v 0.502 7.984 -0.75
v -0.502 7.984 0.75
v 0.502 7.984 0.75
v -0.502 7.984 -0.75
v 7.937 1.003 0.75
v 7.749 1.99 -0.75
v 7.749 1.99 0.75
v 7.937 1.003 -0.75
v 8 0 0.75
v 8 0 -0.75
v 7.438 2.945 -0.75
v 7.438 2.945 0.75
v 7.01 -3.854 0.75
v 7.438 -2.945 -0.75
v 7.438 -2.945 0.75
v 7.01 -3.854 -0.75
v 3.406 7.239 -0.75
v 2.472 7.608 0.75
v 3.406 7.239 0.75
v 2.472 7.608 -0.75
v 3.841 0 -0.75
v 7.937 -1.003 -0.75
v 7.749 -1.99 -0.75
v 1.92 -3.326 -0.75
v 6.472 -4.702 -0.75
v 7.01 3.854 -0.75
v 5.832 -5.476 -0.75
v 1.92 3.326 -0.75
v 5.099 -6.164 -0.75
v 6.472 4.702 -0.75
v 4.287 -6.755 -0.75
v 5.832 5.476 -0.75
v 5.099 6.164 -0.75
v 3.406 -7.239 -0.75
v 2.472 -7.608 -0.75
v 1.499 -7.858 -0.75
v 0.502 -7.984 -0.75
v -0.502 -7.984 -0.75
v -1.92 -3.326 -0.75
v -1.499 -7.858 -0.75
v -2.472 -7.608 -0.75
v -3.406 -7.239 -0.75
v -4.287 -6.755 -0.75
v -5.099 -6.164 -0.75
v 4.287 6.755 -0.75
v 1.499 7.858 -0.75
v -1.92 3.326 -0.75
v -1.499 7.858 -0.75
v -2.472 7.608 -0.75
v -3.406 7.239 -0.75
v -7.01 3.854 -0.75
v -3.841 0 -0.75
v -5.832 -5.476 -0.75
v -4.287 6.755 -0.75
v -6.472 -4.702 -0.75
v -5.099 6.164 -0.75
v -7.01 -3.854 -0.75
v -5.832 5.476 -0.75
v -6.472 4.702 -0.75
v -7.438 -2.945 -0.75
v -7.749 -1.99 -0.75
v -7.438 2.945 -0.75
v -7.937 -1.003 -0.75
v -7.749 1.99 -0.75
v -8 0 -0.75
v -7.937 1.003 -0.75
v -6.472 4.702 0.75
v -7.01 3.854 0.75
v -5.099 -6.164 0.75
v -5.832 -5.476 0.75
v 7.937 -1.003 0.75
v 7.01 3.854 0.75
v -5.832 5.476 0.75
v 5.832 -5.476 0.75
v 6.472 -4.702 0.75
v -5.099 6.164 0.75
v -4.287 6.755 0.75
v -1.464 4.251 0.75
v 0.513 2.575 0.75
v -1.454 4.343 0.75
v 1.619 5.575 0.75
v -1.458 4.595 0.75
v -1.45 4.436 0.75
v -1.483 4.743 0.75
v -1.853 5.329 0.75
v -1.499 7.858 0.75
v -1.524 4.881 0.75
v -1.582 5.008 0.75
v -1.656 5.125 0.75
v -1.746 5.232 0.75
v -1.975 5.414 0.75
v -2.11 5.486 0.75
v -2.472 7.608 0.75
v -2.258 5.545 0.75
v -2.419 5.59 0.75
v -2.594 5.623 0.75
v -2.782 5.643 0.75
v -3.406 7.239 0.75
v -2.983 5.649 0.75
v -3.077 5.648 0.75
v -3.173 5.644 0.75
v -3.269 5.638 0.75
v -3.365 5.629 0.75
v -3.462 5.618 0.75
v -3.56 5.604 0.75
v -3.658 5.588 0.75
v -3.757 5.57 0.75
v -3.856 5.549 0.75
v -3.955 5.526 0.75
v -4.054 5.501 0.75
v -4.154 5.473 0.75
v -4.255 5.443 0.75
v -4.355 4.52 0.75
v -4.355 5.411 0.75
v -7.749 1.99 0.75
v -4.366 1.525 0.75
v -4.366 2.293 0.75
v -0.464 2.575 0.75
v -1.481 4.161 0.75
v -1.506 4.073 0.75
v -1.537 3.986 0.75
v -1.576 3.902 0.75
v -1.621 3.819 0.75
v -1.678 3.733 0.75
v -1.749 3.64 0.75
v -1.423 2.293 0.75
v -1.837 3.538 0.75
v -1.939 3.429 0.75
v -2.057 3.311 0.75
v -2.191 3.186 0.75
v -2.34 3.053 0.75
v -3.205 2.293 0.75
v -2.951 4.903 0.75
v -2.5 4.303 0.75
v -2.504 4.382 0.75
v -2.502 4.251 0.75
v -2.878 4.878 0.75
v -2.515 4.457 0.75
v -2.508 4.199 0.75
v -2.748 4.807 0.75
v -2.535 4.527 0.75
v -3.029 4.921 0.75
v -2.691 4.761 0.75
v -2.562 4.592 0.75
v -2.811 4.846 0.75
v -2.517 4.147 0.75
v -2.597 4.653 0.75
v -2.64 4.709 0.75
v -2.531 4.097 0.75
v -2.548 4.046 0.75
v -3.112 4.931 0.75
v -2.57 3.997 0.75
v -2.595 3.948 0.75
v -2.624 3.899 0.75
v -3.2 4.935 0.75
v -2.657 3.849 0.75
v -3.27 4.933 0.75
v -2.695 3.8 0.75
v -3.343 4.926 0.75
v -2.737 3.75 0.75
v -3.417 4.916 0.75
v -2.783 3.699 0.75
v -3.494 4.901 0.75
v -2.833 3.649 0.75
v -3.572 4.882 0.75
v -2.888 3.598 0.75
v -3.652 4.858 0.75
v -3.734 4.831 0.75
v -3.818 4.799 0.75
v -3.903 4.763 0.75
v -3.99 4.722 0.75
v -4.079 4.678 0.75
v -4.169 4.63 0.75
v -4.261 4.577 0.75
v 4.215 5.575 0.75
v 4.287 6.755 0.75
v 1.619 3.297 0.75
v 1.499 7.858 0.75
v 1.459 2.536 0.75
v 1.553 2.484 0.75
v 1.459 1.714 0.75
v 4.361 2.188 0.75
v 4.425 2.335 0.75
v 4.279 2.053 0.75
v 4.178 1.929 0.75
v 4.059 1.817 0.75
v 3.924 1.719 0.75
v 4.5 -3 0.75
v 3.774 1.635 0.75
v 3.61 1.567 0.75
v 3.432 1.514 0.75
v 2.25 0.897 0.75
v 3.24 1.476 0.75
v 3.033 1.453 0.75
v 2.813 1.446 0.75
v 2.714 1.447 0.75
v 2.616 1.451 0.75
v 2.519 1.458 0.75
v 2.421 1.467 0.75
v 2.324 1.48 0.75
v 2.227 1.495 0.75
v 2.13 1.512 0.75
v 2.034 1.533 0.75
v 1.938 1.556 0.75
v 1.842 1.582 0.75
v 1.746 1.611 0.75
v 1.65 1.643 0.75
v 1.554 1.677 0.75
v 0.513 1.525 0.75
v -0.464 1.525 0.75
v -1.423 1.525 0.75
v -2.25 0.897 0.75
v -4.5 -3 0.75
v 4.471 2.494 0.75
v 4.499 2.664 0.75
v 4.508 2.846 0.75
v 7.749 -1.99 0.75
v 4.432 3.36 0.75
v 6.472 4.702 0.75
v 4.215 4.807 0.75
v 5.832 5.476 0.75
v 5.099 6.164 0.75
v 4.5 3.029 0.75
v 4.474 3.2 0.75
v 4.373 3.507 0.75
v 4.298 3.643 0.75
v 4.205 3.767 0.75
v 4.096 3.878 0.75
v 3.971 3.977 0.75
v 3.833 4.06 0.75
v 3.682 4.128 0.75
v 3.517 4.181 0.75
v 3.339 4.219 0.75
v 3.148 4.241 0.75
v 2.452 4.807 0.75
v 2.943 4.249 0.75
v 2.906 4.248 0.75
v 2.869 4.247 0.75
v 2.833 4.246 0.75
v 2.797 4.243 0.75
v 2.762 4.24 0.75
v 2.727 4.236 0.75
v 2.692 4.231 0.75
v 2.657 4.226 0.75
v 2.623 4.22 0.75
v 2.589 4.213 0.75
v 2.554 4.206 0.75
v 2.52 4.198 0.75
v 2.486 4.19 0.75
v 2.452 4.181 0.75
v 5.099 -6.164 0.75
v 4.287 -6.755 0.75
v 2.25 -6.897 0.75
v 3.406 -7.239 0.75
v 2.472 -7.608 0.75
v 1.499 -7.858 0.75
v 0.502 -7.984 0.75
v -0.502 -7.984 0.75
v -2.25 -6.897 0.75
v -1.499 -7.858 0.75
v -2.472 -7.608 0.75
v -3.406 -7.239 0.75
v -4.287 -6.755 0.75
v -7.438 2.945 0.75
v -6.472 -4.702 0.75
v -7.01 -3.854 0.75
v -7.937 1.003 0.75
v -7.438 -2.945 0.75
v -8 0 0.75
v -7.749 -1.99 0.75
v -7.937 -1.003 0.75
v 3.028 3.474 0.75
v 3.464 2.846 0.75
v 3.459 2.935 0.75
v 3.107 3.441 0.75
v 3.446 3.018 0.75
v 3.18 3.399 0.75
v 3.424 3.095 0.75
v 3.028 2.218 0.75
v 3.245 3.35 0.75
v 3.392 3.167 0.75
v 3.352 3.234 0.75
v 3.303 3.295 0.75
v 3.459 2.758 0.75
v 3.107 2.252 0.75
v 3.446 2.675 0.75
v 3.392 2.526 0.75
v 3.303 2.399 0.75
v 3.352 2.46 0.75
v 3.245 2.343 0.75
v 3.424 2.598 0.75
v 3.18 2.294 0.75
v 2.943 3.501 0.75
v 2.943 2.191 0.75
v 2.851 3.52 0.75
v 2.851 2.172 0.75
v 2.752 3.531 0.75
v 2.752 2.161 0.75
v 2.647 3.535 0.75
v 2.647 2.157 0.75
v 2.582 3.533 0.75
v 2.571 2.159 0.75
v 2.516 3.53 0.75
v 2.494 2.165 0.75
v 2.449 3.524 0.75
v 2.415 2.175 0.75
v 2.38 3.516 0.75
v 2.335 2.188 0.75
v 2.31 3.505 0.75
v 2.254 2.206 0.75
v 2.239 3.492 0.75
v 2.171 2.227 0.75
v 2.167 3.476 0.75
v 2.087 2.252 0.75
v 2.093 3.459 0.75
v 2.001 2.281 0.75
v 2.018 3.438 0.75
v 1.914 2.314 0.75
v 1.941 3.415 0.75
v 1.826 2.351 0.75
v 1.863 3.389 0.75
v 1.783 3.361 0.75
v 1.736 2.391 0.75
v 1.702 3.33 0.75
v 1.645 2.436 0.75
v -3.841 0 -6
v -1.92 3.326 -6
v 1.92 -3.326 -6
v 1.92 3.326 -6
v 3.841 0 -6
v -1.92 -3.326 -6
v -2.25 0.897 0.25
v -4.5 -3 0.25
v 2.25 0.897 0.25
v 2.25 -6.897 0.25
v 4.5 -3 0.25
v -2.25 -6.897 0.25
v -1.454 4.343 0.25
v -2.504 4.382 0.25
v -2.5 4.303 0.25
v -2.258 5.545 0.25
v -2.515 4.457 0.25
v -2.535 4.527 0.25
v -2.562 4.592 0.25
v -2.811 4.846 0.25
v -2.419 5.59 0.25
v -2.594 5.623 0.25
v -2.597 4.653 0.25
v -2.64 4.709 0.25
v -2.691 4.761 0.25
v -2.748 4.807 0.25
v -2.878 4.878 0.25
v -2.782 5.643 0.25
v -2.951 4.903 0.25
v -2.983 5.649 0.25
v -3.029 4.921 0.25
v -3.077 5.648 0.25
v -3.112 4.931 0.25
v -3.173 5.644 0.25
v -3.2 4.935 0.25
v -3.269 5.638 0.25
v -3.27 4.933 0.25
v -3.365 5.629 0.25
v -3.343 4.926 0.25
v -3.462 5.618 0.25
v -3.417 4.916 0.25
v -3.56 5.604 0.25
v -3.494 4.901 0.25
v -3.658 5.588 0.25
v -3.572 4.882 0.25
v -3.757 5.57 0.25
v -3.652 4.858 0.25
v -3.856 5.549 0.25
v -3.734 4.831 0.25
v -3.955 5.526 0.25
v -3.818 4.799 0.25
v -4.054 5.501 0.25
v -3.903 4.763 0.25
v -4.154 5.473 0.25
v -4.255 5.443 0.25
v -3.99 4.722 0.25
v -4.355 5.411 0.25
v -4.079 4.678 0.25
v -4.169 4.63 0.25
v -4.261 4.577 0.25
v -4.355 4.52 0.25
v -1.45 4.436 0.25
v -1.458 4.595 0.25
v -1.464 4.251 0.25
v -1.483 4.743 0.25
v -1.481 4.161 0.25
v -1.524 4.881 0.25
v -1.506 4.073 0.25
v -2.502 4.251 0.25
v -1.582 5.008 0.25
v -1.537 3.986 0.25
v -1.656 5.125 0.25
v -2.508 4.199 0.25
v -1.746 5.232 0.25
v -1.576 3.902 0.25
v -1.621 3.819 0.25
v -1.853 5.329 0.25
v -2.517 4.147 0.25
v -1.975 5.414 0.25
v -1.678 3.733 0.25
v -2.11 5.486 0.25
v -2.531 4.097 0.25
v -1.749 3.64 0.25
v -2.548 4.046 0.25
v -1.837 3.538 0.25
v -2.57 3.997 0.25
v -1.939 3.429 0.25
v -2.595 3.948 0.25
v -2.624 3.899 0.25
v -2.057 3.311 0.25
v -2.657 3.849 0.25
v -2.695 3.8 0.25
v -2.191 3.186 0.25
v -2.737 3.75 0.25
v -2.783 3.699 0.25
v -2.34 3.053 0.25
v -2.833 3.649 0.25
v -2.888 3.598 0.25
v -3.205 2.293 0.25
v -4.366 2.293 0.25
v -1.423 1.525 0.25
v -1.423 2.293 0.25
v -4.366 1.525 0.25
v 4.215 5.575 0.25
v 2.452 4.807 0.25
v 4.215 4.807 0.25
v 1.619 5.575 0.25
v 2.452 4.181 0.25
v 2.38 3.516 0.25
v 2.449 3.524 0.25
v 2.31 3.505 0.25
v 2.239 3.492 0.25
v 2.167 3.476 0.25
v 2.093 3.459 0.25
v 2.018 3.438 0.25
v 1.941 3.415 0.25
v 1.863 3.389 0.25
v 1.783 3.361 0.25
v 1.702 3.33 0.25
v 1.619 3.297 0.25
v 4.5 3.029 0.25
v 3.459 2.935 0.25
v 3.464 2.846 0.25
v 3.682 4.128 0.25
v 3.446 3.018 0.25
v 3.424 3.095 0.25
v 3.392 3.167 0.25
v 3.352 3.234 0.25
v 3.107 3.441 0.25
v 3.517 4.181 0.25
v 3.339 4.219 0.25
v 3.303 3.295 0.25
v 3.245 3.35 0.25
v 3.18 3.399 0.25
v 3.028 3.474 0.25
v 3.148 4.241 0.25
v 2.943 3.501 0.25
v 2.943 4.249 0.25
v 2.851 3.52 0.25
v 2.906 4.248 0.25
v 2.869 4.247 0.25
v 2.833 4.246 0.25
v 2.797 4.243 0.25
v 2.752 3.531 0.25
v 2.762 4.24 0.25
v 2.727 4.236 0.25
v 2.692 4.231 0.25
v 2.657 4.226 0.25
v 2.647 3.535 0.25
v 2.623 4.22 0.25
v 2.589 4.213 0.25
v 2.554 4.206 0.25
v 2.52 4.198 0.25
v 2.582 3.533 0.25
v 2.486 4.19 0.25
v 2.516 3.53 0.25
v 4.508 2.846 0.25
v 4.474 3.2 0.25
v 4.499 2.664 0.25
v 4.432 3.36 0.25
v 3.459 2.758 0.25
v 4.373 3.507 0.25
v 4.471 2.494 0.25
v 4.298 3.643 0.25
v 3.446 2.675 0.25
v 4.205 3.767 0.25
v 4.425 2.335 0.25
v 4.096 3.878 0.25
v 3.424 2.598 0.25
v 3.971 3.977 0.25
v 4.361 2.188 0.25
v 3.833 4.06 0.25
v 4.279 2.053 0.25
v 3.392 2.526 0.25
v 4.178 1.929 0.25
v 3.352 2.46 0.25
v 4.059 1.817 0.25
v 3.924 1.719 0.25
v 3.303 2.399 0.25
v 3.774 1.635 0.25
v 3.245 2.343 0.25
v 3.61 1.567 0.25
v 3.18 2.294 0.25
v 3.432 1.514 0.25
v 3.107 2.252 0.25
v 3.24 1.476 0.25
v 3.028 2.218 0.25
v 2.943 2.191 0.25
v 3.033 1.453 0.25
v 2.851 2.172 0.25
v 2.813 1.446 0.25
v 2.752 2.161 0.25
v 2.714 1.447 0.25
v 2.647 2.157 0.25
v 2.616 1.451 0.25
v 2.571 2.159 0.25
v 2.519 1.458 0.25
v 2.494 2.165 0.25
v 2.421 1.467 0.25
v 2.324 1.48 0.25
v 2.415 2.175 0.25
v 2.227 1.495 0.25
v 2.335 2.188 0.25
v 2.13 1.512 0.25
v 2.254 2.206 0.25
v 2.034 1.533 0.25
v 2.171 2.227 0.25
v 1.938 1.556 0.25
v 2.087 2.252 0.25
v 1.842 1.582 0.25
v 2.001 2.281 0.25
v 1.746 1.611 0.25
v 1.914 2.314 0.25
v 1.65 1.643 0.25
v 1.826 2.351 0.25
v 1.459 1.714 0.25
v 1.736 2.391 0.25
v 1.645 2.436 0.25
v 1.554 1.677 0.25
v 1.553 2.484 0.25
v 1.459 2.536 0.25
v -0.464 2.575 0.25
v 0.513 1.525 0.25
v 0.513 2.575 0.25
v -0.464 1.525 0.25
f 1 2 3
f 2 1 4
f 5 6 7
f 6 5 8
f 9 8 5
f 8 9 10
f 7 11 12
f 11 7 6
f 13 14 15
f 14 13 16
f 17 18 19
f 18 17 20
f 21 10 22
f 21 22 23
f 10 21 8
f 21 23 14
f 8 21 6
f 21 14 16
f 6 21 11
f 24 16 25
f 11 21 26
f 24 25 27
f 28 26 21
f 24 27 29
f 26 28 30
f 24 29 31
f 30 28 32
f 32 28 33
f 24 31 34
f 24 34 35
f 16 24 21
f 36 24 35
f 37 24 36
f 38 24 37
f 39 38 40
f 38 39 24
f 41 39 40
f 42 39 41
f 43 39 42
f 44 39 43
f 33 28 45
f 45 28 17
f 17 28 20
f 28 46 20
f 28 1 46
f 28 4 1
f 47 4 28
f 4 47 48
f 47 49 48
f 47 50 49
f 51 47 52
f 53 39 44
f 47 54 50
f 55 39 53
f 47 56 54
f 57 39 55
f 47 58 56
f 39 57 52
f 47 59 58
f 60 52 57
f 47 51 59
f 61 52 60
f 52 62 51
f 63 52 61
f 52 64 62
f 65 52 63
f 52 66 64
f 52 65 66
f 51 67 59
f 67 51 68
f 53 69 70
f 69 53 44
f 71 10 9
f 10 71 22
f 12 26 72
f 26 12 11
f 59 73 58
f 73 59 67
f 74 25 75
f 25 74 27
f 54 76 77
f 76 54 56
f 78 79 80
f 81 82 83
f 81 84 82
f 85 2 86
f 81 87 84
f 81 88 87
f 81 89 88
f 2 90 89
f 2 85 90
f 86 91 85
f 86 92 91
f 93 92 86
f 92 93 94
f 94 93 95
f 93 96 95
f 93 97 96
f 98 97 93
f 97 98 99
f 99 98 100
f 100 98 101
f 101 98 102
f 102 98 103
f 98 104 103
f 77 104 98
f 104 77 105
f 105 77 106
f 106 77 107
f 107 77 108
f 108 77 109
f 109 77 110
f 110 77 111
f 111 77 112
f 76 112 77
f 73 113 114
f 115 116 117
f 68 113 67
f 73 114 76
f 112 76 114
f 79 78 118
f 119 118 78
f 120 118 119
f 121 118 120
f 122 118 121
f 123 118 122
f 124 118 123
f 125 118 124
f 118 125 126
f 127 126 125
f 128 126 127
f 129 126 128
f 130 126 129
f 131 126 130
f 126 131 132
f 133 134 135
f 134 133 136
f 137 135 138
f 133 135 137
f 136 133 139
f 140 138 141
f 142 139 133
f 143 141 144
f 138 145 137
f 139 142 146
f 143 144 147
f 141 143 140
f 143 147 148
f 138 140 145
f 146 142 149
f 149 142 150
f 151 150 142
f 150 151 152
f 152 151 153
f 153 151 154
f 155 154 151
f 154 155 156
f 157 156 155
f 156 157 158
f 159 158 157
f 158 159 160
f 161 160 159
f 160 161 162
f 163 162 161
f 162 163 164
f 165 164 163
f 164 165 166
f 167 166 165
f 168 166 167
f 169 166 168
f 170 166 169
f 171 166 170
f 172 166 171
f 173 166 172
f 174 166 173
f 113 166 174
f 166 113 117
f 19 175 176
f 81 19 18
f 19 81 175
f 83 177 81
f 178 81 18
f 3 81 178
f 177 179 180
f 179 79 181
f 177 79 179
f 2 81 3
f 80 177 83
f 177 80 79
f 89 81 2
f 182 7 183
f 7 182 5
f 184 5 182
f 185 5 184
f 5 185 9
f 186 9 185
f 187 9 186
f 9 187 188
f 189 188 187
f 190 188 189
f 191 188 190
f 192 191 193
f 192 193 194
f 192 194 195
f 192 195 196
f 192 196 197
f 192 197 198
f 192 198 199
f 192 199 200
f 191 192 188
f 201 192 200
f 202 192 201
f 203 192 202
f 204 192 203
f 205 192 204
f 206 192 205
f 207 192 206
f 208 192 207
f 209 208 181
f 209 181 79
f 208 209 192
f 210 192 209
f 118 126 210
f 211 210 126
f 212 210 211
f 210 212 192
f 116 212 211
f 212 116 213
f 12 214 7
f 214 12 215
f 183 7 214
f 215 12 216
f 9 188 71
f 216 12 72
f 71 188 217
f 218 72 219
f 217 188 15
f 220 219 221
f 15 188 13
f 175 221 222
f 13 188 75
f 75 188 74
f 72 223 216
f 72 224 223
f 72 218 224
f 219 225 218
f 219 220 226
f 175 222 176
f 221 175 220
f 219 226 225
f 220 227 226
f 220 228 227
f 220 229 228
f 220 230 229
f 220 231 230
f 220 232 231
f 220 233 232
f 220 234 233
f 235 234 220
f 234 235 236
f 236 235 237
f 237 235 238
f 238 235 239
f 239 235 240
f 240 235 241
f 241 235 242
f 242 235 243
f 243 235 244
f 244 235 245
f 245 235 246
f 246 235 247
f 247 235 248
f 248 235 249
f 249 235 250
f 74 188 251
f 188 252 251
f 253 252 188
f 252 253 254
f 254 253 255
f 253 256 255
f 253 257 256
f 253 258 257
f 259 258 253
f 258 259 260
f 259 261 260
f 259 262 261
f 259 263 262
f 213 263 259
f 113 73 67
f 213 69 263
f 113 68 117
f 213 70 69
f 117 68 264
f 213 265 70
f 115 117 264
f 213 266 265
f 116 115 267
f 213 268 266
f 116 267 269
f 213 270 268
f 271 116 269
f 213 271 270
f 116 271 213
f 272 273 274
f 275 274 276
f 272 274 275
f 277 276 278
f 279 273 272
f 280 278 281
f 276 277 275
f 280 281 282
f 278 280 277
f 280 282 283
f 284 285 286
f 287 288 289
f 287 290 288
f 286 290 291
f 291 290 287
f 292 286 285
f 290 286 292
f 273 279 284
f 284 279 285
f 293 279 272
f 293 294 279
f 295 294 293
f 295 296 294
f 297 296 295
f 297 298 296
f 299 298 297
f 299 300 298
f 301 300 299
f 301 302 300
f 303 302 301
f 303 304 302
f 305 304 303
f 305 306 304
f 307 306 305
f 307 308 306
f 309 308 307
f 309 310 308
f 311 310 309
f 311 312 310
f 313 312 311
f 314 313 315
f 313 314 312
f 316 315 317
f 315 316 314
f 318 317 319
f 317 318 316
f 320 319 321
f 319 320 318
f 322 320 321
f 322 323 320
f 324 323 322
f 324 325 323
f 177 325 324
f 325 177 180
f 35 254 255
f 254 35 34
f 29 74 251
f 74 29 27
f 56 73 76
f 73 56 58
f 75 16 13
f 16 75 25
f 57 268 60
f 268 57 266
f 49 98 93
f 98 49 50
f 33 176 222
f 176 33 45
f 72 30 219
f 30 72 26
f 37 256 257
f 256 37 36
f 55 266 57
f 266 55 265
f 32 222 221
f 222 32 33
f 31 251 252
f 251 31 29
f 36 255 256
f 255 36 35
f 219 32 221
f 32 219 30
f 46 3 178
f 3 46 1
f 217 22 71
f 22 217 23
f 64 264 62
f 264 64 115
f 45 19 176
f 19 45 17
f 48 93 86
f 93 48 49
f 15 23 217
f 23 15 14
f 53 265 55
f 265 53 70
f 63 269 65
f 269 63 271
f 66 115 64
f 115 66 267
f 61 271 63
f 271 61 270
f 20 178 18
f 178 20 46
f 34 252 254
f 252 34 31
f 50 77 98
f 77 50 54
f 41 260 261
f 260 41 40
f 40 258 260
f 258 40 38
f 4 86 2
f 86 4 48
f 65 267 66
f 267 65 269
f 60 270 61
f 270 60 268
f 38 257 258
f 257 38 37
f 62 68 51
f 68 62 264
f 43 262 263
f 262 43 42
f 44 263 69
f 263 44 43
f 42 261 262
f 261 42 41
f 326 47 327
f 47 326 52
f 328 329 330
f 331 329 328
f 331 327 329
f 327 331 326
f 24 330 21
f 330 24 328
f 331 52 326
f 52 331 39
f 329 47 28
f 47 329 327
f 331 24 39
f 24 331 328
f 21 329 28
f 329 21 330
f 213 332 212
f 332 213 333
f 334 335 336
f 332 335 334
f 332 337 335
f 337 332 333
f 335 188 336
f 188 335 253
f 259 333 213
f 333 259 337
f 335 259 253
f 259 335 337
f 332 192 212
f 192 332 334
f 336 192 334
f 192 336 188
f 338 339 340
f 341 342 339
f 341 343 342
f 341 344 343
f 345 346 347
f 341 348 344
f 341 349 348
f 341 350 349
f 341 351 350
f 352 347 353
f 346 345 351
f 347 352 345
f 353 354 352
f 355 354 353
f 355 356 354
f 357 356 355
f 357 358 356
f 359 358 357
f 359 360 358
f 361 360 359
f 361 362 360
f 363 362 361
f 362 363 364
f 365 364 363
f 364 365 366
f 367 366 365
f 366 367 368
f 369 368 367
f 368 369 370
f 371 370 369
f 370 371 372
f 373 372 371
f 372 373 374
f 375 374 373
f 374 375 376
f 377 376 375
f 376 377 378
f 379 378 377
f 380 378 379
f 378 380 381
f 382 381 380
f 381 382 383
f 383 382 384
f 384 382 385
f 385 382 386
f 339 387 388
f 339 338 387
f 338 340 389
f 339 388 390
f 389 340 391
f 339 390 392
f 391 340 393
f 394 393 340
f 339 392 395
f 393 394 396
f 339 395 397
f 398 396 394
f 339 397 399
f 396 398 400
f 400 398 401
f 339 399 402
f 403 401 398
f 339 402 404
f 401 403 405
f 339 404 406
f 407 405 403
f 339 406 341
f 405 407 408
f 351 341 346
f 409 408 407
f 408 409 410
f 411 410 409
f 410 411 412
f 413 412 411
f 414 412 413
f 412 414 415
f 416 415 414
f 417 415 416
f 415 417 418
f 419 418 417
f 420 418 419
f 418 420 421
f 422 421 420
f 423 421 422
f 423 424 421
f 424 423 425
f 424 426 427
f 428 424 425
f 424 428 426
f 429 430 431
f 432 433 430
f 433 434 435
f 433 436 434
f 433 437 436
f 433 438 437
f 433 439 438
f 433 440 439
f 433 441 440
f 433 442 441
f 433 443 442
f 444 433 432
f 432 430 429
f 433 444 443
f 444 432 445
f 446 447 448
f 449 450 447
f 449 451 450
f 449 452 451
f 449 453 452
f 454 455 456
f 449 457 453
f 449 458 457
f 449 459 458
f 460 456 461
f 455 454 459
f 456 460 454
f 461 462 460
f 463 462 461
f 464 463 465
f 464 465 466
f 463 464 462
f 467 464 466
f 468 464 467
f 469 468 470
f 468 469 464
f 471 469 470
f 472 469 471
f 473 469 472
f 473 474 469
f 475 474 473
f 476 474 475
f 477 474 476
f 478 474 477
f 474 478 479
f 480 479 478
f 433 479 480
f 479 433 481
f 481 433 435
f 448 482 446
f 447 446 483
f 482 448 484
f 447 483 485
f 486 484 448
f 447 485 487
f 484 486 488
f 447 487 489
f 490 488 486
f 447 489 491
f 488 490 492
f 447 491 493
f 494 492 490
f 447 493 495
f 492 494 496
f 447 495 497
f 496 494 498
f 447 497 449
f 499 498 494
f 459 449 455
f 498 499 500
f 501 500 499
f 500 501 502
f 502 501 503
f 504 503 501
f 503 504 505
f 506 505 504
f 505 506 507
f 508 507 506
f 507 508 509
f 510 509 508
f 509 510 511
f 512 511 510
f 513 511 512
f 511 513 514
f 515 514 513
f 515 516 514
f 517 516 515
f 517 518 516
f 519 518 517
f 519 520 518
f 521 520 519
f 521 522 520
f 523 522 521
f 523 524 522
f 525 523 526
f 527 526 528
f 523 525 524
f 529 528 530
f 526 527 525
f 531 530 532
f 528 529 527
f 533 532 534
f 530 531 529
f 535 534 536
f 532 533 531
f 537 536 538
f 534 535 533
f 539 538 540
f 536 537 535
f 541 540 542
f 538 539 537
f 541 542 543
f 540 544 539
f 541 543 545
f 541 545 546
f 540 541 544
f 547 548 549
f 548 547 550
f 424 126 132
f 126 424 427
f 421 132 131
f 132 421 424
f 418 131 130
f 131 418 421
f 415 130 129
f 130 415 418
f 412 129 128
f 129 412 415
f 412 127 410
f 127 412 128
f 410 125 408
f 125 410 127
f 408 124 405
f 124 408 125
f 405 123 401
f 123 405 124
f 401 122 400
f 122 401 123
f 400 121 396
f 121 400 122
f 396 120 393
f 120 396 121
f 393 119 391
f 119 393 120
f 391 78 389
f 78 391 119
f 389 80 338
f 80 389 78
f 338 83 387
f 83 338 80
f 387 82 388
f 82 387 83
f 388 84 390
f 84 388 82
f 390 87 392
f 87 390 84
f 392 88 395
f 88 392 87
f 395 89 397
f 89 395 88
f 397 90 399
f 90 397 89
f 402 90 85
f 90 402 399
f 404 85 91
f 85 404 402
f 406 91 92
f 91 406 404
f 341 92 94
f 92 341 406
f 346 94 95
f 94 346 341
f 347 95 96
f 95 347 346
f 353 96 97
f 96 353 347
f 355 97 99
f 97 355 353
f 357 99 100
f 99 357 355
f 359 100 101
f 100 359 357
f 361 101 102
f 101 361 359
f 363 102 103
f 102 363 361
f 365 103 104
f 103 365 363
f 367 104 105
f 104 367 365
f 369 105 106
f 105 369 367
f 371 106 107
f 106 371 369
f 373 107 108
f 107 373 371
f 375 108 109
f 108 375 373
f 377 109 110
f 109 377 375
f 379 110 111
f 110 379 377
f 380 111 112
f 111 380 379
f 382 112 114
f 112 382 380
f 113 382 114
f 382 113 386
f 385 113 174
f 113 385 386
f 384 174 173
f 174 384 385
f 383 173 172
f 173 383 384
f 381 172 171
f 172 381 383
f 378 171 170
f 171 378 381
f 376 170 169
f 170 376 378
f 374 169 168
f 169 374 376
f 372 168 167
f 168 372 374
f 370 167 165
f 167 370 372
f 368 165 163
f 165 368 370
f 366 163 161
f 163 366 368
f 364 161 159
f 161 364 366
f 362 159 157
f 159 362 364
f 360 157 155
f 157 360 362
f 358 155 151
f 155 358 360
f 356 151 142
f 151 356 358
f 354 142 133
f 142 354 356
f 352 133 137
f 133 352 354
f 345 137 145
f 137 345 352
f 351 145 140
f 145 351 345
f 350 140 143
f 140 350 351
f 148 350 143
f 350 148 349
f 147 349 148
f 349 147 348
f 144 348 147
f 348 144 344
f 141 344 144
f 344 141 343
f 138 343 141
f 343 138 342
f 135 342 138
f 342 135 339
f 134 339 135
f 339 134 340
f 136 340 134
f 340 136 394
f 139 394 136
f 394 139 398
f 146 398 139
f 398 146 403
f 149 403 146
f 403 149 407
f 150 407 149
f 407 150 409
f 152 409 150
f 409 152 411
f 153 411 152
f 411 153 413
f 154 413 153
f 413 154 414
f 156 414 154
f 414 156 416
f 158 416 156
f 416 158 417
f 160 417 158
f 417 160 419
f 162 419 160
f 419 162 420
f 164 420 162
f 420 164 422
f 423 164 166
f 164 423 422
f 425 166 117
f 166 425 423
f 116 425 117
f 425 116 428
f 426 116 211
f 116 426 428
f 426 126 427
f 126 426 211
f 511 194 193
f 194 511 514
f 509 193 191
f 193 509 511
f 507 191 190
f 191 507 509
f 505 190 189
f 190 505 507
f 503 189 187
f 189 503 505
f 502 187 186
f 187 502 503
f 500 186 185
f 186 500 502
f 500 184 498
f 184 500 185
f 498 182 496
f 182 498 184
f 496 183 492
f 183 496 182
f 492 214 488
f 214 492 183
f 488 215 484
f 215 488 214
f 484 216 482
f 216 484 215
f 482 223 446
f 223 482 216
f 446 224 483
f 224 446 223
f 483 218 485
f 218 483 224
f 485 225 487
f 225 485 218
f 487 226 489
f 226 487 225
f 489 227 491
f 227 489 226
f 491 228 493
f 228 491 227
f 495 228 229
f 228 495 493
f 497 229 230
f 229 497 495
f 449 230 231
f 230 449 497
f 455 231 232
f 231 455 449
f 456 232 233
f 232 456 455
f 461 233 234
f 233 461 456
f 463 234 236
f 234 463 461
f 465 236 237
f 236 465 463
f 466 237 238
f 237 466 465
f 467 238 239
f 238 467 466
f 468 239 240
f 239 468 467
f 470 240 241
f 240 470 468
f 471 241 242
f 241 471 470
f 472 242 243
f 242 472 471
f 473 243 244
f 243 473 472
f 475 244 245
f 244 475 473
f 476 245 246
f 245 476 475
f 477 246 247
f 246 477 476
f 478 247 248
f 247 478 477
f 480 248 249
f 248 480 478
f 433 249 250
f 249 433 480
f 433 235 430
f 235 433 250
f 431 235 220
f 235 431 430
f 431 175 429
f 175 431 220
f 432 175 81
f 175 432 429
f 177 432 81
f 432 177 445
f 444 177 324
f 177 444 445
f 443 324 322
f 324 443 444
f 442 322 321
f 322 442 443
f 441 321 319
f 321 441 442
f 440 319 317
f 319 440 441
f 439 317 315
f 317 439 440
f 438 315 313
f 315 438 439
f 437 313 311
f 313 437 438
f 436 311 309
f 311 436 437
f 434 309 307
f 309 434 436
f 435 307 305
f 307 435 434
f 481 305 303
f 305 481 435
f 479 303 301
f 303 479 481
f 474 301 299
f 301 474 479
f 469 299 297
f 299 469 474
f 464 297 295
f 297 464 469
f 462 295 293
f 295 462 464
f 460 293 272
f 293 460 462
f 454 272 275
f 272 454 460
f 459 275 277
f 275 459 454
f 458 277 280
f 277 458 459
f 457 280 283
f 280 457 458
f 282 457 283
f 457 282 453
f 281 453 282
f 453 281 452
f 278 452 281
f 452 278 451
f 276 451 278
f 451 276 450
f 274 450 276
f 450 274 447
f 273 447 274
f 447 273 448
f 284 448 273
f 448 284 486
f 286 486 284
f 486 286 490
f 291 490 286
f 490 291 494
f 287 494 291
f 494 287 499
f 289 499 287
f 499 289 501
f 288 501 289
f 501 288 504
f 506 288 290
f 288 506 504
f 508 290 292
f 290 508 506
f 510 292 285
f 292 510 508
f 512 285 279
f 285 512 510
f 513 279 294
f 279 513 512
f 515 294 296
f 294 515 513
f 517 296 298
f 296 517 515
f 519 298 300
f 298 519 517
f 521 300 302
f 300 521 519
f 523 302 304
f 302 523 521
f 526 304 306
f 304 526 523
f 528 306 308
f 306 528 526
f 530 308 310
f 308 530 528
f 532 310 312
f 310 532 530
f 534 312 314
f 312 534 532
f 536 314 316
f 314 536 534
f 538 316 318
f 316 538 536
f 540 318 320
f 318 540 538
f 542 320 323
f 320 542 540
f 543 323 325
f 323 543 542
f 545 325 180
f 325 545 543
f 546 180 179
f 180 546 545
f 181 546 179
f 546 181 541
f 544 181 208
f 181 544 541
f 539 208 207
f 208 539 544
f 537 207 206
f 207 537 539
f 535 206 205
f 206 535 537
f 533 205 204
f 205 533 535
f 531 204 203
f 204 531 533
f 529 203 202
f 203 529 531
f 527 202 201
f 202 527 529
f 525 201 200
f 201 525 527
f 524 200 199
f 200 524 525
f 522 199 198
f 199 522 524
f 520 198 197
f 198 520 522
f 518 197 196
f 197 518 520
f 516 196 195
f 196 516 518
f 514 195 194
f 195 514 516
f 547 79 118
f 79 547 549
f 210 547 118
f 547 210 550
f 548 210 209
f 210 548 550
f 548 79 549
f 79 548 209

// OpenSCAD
$fn = 50;


difference() {
	union() {
		translate(v = [0, 0, -0.7500000000]) {
			cylinder(h = 1.5000000000, r = 8.0000000000);
		}
		translate(v = [0, 0, -6]) {
			linear_extrude(height = 6) {
				polygon(points = [[3.8408550000, 0.0000000000], [1.9204275000, 3.3262780023], [-1.9204275000, 3.3262780023], [-3.8408550000, 0.0000000000], [-1.9204275000, -3.3262780023], [1.9204275000, -3.3262780023]]);
			}
		}
	}
	union() {
		translate(v = [0, -3, 0.2500000000]) {
			#linear_extrude(height = 0.5000000000) {
				polygon(points = [[4.5000000000, 0.0000000000], [2.2500000000, 3.8971143170], [-2.2500000000, 3.8971143170], [-4.5000000000, 0.0000000000], [-2.2500000000, -3.8971143170], [2.2500000000, -3.8971143170]]);
			}
		}
		#translate(v = [0, 3.5000000000, 0.2500000000]) {
			linear_extrude(height = 0.5000000000) {
				text(font = "SegoiUI:Bold", halign = "center", size = 4, text = "2.5", valign = "center");
			}
		}
	}
}
